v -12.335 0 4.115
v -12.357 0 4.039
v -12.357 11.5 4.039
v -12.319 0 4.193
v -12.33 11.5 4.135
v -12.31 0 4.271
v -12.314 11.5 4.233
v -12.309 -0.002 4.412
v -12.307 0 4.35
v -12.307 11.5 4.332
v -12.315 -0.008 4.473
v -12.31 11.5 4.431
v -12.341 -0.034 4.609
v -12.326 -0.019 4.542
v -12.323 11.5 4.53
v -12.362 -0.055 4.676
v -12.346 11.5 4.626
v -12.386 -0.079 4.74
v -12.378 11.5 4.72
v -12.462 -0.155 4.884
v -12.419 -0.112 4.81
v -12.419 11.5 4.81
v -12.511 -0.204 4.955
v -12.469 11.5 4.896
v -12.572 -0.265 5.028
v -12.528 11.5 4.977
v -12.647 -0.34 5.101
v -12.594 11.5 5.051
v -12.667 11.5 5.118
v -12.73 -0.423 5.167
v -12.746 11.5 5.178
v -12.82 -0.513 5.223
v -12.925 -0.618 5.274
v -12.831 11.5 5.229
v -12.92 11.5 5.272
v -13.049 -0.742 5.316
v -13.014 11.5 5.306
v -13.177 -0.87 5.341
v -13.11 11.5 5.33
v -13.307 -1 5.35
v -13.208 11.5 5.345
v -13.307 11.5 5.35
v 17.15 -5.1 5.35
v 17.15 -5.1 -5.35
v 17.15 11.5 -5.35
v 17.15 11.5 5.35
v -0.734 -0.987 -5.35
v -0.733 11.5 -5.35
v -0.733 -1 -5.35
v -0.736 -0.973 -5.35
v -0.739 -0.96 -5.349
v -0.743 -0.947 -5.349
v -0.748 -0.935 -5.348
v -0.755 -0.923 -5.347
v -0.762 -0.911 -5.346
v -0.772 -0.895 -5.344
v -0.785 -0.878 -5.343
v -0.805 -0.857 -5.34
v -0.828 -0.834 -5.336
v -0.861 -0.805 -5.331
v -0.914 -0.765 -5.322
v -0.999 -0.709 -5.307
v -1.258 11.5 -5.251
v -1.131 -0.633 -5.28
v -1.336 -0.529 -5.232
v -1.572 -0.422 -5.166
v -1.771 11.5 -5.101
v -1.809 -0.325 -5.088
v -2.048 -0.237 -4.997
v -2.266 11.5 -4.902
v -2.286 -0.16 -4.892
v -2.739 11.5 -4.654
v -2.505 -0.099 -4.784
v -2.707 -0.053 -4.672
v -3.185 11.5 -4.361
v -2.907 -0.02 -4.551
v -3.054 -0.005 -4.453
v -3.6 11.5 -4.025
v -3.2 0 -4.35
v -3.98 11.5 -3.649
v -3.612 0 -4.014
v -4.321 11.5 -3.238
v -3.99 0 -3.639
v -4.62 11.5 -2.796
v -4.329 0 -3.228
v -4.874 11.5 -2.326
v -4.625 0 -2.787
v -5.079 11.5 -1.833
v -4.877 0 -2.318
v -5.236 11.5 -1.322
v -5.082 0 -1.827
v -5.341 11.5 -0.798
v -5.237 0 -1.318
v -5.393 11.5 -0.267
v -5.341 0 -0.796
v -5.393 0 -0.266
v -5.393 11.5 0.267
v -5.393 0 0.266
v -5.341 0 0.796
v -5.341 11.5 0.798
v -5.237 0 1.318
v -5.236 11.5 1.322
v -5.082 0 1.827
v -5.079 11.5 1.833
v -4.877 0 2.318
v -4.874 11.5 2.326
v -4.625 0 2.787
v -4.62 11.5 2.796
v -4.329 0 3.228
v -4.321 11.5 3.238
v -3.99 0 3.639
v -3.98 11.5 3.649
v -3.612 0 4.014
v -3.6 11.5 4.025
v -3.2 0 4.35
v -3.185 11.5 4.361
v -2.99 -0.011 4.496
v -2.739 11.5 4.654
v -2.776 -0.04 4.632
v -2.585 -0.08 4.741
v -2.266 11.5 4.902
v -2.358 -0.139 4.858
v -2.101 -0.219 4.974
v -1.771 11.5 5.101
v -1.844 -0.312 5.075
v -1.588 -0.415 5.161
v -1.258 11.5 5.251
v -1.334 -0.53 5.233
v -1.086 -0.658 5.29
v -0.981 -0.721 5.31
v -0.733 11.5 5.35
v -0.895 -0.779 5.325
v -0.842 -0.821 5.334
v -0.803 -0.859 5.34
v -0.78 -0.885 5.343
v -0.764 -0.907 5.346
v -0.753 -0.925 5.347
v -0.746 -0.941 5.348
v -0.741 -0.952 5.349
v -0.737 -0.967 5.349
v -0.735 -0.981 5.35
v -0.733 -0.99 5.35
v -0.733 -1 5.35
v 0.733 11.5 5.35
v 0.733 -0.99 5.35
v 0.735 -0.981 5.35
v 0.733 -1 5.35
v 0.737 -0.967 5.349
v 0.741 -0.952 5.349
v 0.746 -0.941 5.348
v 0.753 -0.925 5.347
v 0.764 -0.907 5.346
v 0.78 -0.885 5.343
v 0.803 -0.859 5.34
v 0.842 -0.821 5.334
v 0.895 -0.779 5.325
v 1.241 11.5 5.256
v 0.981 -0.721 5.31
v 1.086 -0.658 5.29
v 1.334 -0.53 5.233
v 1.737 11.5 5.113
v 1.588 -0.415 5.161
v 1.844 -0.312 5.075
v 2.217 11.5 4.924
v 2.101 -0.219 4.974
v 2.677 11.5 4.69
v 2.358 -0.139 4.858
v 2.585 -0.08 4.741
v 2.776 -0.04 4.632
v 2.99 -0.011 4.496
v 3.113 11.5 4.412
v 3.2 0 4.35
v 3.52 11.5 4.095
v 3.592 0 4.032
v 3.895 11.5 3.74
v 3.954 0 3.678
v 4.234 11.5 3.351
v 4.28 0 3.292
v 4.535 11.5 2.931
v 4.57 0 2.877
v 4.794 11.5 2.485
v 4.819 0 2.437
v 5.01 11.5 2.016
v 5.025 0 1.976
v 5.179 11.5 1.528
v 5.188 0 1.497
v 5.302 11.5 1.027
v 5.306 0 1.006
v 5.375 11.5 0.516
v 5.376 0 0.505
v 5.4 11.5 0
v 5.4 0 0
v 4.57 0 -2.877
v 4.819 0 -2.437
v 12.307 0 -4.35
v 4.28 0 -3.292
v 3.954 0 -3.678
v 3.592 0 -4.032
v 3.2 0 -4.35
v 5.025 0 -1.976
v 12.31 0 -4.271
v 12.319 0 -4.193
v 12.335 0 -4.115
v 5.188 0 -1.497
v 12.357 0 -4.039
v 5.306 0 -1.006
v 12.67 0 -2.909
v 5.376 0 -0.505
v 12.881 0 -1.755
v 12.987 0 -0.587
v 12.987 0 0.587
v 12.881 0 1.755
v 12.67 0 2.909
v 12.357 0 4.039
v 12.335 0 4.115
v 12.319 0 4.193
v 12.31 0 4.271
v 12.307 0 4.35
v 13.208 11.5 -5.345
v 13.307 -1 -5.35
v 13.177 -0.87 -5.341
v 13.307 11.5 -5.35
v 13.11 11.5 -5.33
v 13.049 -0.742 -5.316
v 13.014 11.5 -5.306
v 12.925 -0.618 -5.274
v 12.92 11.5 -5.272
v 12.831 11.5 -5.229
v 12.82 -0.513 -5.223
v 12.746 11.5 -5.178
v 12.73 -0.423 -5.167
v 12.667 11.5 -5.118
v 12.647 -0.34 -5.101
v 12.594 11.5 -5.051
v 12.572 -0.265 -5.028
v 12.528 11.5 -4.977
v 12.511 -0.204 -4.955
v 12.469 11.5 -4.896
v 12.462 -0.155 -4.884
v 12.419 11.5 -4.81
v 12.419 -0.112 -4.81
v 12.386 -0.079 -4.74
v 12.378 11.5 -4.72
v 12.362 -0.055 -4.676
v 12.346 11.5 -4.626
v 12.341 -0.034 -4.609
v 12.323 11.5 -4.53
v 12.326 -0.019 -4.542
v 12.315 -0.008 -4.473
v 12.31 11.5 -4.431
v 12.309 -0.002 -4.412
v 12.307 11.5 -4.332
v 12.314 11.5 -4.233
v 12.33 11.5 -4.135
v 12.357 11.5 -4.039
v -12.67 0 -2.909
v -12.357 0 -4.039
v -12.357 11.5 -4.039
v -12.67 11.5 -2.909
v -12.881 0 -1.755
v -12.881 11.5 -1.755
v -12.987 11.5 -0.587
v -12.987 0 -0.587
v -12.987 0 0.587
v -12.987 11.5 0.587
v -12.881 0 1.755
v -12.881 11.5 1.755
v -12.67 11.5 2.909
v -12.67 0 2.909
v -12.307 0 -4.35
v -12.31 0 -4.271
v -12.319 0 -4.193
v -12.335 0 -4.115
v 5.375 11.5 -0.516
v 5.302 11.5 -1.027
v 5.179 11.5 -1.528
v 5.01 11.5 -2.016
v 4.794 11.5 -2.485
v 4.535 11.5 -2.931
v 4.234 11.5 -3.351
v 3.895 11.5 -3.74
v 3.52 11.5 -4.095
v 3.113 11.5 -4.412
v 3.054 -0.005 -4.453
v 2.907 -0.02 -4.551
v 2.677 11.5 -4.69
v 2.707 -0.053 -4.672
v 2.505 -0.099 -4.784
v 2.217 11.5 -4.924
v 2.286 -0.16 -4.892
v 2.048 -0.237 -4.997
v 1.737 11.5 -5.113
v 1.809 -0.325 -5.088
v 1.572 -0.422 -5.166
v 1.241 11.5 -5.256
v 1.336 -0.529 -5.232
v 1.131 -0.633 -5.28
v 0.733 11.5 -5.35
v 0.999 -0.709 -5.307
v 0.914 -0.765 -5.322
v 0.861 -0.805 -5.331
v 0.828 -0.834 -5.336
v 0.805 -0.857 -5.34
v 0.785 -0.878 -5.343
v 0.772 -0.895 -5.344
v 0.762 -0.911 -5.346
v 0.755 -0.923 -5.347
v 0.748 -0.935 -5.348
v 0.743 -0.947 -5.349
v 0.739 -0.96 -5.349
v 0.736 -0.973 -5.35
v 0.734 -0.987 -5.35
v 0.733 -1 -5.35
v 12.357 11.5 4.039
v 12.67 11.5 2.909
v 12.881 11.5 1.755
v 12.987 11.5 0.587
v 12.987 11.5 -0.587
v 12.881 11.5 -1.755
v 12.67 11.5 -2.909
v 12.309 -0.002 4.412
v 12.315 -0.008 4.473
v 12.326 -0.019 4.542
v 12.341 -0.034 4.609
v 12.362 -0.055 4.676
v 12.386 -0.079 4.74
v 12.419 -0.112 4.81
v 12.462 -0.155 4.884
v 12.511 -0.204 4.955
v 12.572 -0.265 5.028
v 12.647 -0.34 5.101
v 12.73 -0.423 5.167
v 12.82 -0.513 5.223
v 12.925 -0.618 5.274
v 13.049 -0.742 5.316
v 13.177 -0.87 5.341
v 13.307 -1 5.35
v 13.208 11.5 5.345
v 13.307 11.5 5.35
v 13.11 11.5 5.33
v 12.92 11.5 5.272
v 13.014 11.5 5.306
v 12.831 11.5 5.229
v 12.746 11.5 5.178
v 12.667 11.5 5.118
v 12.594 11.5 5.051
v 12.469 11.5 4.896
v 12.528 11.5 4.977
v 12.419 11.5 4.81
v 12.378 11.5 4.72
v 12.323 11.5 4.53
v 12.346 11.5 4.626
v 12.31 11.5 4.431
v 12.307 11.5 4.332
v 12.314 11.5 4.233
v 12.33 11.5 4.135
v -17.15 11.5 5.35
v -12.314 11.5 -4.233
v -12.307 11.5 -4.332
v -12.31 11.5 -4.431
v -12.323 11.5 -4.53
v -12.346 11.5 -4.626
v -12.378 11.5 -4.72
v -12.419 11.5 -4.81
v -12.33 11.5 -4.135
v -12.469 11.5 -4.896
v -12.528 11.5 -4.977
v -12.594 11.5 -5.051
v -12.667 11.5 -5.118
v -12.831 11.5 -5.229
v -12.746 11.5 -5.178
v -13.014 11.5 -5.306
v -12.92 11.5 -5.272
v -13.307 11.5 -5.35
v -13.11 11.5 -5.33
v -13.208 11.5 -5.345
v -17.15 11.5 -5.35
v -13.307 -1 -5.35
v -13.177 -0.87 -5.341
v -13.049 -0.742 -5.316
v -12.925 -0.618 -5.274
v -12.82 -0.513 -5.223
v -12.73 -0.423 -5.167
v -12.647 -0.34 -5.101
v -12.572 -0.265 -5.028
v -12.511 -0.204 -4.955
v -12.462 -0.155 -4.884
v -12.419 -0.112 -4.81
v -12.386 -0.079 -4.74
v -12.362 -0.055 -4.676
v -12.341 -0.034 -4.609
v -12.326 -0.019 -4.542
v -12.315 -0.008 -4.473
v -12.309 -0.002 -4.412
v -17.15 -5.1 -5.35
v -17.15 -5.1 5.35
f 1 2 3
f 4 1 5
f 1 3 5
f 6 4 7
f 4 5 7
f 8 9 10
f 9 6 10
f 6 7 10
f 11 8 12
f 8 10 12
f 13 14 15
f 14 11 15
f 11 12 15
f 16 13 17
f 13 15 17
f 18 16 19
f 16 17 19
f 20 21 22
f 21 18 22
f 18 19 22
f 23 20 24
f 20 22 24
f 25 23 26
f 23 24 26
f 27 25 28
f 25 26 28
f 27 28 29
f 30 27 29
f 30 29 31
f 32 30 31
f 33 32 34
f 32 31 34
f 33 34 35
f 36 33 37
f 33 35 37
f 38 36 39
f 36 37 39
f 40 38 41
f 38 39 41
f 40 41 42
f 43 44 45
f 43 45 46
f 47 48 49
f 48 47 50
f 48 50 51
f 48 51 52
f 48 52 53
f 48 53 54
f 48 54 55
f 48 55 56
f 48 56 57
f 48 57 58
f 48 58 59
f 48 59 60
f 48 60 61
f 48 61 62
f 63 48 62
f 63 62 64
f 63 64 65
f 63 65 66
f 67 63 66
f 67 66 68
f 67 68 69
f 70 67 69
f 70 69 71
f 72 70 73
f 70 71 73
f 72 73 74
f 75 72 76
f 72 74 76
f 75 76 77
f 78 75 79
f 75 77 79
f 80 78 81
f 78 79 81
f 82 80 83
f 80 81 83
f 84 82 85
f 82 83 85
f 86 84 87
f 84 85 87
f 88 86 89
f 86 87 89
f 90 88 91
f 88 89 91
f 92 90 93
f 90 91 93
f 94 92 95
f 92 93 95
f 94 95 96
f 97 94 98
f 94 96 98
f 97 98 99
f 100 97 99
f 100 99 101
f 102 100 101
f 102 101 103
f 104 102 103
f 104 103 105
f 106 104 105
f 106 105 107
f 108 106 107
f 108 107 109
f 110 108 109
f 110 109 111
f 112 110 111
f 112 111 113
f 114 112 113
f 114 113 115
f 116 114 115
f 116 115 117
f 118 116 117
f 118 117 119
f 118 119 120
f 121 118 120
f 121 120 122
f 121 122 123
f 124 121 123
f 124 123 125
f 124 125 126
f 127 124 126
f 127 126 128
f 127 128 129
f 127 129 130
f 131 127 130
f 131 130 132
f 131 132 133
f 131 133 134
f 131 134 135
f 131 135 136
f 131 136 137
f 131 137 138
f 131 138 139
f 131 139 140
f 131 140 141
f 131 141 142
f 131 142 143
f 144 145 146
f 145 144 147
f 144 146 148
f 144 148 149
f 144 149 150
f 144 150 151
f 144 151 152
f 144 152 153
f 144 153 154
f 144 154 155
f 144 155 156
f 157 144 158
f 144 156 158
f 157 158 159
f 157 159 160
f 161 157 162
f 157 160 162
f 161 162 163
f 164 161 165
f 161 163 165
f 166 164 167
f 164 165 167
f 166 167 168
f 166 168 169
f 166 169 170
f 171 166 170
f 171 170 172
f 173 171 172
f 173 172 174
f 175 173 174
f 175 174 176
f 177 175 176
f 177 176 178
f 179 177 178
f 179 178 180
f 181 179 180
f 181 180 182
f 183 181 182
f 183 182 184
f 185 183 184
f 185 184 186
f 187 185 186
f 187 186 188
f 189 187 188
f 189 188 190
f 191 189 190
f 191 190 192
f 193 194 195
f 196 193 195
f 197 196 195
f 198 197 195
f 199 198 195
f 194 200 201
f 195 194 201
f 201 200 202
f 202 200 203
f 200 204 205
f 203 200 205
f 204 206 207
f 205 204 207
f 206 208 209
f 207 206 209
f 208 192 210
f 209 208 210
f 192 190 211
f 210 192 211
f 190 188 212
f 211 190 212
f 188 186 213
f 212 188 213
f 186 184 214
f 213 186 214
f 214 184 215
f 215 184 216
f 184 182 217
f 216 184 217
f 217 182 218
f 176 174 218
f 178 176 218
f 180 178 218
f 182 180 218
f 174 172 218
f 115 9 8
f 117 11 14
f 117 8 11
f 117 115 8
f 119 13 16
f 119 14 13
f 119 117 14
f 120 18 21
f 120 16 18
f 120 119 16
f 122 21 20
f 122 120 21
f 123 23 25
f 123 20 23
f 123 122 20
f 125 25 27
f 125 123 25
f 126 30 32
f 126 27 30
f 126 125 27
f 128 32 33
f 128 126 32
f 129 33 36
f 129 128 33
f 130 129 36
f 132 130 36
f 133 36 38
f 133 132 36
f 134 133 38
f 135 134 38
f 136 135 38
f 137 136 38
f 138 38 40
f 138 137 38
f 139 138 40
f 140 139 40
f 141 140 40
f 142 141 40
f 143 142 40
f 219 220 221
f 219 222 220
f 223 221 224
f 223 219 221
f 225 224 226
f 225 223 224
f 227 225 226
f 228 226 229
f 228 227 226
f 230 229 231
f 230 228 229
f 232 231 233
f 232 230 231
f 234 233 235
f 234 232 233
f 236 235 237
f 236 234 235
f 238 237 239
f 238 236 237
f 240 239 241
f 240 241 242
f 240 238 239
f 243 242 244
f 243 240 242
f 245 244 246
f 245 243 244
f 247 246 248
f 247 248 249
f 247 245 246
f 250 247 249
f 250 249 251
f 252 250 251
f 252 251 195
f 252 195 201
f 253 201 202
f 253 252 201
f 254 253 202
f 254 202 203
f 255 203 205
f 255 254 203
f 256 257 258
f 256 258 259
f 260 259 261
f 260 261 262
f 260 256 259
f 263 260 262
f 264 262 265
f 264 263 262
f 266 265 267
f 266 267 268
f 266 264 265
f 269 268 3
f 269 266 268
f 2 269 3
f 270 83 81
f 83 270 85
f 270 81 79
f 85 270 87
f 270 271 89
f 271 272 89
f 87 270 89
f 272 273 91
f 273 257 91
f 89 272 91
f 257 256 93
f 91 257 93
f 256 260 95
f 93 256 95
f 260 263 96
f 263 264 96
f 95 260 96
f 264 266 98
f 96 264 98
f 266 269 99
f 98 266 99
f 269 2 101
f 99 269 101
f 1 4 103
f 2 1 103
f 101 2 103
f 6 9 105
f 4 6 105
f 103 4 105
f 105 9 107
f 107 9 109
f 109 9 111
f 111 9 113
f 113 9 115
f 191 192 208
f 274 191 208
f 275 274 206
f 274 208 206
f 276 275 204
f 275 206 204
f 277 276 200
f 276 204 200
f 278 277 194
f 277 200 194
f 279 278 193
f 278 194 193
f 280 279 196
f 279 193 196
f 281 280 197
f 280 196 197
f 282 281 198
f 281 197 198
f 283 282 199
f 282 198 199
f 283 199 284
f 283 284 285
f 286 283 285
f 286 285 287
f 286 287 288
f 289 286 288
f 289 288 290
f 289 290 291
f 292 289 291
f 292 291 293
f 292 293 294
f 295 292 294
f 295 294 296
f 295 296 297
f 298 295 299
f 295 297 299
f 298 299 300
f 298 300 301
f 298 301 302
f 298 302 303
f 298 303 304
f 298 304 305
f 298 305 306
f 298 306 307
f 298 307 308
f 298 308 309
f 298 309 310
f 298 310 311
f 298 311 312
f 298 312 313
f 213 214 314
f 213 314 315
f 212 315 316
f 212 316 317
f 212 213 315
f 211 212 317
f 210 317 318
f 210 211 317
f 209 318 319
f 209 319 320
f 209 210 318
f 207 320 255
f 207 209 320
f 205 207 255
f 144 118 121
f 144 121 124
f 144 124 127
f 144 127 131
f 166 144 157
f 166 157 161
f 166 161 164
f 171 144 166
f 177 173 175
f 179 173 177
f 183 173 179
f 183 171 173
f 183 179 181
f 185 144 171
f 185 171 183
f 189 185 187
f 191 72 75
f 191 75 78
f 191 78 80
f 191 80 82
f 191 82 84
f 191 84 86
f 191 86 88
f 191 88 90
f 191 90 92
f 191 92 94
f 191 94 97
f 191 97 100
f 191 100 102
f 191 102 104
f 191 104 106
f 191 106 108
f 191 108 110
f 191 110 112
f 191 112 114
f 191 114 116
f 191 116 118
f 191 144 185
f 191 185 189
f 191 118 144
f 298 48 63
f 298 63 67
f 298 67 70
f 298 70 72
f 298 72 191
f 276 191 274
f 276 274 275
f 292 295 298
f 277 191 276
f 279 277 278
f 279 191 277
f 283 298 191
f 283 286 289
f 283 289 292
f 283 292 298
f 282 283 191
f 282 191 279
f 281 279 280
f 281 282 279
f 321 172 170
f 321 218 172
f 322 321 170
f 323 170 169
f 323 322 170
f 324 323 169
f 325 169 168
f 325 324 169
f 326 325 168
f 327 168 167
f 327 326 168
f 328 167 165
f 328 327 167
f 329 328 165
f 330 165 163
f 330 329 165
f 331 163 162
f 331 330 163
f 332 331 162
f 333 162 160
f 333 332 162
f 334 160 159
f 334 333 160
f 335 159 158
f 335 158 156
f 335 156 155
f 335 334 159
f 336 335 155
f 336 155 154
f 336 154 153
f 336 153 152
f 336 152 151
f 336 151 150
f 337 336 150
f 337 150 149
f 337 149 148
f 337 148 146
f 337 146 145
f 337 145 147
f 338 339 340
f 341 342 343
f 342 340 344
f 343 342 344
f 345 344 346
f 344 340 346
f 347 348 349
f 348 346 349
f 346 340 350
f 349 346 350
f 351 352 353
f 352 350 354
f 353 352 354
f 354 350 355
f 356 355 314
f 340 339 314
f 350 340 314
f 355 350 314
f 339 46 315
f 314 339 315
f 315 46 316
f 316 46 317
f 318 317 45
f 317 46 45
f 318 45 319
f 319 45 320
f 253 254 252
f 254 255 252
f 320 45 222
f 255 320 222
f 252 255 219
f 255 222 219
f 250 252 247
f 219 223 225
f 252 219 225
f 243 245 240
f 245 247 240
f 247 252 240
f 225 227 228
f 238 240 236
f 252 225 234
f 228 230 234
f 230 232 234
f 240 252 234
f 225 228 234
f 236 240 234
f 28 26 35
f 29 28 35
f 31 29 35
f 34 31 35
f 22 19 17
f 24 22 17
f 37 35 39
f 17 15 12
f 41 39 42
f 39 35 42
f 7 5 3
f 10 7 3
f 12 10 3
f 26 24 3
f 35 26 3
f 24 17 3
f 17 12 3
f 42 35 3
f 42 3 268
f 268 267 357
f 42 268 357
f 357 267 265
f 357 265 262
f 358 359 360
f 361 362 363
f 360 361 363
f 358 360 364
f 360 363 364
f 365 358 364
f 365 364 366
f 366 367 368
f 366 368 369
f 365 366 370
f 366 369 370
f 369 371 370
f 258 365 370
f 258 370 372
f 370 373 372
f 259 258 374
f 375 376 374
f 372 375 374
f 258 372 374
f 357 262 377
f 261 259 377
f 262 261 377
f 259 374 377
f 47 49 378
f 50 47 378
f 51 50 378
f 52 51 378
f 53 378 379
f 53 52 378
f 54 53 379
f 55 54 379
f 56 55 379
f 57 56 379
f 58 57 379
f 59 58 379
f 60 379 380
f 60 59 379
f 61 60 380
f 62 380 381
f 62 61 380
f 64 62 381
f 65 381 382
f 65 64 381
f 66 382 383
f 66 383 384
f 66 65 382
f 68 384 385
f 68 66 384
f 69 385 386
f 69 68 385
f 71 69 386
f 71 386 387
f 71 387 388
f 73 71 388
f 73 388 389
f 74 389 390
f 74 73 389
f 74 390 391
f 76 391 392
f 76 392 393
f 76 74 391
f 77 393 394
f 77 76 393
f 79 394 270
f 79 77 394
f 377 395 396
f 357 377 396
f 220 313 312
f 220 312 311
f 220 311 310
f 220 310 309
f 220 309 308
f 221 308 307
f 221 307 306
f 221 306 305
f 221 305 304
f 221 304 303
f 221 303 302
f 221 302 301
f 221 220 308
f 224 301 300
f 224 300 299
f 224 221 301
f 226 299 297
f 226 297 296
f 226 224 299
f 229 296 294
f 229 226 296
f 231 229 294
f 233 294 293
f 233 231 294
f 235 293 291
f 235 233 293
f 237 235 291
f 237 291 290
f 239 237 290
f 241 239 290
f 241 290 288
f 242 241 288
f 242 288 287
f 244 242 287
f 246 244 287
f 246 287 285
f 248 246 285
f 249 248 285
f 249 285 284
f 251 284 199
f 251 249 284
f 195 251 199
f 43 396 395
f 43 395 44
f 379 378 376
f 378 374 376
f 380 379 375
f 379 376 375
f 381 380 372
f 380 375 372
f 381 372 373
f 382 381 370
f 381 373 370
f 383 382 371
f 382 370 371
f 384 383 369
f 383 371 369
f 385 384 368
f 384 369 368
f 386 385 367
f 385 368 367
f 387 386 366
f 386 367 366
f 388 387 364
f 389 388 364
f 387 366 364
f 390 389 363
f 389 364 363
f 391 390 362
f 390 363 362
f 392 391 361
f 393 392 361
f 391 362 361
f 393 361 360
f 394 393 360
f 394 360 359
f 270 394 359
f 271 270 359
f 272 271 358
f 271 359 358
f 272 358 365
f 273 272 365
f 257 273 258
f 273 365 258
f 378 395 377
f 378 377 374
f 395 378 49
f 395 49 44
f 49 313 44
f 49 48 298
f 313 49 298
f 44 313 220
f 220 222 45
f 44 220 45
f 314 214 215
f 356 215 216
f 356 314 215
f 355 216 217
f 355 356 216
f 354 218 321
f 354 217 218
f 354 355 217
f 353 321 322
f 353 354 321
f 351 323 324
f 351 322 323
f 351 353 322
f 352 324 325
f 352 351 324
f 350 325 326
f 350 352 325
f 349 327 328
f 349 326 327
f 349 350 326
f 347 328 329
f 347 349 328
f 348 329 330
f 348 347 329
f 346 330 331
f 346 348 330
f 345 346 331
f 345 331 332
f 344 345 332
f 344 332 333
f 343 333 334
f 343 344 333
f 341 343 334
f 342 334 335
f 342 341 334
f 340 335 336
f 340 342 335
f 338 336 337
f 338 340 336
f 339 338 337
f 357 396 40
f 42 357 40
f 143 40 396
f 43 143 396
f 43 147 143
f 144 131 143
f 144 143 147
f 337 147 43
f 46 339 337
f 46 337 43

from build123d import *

# Parameters (mm, degrees)
BOSS_EXTRUDE1_DEPTH   = 11.5
BOSS_EXTRUDE1_2_DEPTH = 11.5
BOSS_EXTRUDE1_3_DEPTH = 11.5
SKETCH2_W             = 34.3
SKETCH2_H             = 10.7
BOSS_EXTRUDE2_DEPTH   = 5.1
FILLET1_R             = 1


with BuildPart() as part:
    # Sketch1 → Boss-Extrude1 (new body)
    with BuildSketch(Plane(origin=(0, 0, 0), x_dir=(1, 0, 0), z_dir=(0, 1, 0))):
        with BuildLine():
            ThreePointArc((-11.848101114, 5.35), (-13, 0), (-11.848101114, -5.35))
            Line((-11.848101114, -5.35), (-17.15, -5.35))
            Line((-17.15, -5.35), (-17.15, 5.35))
            Line((-17.15, 5.35), (-11.848101114, 5.35))
        make_face()
    extrude(amount=BOSS_EXTRUDE1_DEPTH)



with BuildPart() as body_2:
    # Sketch1 → Boss-Extrude1 2 (new body)
    with BuildSketch(Plane(origin=(0, 0, 0), x_dir=(1, 0, 0), z_dir=(0, 1, 0))):
        with BuildLine():
            Line((0.733143915, 5.35), (-0.733143915, 5.35))
            ThreePointArc((-0.733143915, 5.35), (-5.4, 0), (-0.733143915, -5.35))
            Line((-0.733143915, -5.35), (0.733143915, -5.35))
            ThreePointArc((0.733143915, -5.35), (4.069335151, -3.549719909), (5.4, 0))
            ThreePointArc((5.4, 0), (4.069335151, 3.549719909), (0.733143915, 5.35))
        make_face()
    extrude(amount=BOSS_EXTRUDE1_2_DEPTH)


with BuildPart() as body_3:
    # Sketch1 → Boss-Extrude1 3 (new body)
    with BuildSketch(Plane(origin=(0, 0, 0), x_dir=(1, 0, 0), z_dir=(0, 1, 0))):
        with BuildLine():
            ThreePointArc((11.848101114, -5.35), (13, 0), (11.848101114, 5.35))
            Line((11.848101114, 5.35), (17.15, 5.35))
            Line((17.15, 5.35), (17.15, -5.35))
            Line((17.15, -5.35), (11.848101114, -5.35))
        make_face()
    extrude(amount=BOSS_EXTRUDE1_3_DEPTH)


with BuildPart() as part_1:
    add(part.part)

    add(body_2.part)  # Boss-Extrude2 merges body 2

    add(body_3.part)  # Boss-Extrude2 merges body 3
    # Sketch2 → Boss-Extrude2 (add)
    with BuildSketch(Plane.XZ):
        Rectangle(SKETCH2_W, SKETCH2_H)
    extrude(amount=BOSS_EXTRUDE2_DEPTH)

    # Fillet1
    fillet1_edges = [part_1.edges().sort_by_distance(p)[0] for p in [
        (-6.290622514, 0, -5.35),
        (6.290622514, 0, -5.35),
        (-6.290622514, 0, 5.35),
        (6.290622514, 0, 5.35),
        (11.848101114, 5.75, -5.35),
        (11.848101114, 5.75, 5.35),
        (-11.848101114, 5.75, 5.35),
        (-11.848101114, 5.75, -5.35),
    ]]
    fillet(fillet1_edges, radius=FILLET1_R)


solid = part_1.part
